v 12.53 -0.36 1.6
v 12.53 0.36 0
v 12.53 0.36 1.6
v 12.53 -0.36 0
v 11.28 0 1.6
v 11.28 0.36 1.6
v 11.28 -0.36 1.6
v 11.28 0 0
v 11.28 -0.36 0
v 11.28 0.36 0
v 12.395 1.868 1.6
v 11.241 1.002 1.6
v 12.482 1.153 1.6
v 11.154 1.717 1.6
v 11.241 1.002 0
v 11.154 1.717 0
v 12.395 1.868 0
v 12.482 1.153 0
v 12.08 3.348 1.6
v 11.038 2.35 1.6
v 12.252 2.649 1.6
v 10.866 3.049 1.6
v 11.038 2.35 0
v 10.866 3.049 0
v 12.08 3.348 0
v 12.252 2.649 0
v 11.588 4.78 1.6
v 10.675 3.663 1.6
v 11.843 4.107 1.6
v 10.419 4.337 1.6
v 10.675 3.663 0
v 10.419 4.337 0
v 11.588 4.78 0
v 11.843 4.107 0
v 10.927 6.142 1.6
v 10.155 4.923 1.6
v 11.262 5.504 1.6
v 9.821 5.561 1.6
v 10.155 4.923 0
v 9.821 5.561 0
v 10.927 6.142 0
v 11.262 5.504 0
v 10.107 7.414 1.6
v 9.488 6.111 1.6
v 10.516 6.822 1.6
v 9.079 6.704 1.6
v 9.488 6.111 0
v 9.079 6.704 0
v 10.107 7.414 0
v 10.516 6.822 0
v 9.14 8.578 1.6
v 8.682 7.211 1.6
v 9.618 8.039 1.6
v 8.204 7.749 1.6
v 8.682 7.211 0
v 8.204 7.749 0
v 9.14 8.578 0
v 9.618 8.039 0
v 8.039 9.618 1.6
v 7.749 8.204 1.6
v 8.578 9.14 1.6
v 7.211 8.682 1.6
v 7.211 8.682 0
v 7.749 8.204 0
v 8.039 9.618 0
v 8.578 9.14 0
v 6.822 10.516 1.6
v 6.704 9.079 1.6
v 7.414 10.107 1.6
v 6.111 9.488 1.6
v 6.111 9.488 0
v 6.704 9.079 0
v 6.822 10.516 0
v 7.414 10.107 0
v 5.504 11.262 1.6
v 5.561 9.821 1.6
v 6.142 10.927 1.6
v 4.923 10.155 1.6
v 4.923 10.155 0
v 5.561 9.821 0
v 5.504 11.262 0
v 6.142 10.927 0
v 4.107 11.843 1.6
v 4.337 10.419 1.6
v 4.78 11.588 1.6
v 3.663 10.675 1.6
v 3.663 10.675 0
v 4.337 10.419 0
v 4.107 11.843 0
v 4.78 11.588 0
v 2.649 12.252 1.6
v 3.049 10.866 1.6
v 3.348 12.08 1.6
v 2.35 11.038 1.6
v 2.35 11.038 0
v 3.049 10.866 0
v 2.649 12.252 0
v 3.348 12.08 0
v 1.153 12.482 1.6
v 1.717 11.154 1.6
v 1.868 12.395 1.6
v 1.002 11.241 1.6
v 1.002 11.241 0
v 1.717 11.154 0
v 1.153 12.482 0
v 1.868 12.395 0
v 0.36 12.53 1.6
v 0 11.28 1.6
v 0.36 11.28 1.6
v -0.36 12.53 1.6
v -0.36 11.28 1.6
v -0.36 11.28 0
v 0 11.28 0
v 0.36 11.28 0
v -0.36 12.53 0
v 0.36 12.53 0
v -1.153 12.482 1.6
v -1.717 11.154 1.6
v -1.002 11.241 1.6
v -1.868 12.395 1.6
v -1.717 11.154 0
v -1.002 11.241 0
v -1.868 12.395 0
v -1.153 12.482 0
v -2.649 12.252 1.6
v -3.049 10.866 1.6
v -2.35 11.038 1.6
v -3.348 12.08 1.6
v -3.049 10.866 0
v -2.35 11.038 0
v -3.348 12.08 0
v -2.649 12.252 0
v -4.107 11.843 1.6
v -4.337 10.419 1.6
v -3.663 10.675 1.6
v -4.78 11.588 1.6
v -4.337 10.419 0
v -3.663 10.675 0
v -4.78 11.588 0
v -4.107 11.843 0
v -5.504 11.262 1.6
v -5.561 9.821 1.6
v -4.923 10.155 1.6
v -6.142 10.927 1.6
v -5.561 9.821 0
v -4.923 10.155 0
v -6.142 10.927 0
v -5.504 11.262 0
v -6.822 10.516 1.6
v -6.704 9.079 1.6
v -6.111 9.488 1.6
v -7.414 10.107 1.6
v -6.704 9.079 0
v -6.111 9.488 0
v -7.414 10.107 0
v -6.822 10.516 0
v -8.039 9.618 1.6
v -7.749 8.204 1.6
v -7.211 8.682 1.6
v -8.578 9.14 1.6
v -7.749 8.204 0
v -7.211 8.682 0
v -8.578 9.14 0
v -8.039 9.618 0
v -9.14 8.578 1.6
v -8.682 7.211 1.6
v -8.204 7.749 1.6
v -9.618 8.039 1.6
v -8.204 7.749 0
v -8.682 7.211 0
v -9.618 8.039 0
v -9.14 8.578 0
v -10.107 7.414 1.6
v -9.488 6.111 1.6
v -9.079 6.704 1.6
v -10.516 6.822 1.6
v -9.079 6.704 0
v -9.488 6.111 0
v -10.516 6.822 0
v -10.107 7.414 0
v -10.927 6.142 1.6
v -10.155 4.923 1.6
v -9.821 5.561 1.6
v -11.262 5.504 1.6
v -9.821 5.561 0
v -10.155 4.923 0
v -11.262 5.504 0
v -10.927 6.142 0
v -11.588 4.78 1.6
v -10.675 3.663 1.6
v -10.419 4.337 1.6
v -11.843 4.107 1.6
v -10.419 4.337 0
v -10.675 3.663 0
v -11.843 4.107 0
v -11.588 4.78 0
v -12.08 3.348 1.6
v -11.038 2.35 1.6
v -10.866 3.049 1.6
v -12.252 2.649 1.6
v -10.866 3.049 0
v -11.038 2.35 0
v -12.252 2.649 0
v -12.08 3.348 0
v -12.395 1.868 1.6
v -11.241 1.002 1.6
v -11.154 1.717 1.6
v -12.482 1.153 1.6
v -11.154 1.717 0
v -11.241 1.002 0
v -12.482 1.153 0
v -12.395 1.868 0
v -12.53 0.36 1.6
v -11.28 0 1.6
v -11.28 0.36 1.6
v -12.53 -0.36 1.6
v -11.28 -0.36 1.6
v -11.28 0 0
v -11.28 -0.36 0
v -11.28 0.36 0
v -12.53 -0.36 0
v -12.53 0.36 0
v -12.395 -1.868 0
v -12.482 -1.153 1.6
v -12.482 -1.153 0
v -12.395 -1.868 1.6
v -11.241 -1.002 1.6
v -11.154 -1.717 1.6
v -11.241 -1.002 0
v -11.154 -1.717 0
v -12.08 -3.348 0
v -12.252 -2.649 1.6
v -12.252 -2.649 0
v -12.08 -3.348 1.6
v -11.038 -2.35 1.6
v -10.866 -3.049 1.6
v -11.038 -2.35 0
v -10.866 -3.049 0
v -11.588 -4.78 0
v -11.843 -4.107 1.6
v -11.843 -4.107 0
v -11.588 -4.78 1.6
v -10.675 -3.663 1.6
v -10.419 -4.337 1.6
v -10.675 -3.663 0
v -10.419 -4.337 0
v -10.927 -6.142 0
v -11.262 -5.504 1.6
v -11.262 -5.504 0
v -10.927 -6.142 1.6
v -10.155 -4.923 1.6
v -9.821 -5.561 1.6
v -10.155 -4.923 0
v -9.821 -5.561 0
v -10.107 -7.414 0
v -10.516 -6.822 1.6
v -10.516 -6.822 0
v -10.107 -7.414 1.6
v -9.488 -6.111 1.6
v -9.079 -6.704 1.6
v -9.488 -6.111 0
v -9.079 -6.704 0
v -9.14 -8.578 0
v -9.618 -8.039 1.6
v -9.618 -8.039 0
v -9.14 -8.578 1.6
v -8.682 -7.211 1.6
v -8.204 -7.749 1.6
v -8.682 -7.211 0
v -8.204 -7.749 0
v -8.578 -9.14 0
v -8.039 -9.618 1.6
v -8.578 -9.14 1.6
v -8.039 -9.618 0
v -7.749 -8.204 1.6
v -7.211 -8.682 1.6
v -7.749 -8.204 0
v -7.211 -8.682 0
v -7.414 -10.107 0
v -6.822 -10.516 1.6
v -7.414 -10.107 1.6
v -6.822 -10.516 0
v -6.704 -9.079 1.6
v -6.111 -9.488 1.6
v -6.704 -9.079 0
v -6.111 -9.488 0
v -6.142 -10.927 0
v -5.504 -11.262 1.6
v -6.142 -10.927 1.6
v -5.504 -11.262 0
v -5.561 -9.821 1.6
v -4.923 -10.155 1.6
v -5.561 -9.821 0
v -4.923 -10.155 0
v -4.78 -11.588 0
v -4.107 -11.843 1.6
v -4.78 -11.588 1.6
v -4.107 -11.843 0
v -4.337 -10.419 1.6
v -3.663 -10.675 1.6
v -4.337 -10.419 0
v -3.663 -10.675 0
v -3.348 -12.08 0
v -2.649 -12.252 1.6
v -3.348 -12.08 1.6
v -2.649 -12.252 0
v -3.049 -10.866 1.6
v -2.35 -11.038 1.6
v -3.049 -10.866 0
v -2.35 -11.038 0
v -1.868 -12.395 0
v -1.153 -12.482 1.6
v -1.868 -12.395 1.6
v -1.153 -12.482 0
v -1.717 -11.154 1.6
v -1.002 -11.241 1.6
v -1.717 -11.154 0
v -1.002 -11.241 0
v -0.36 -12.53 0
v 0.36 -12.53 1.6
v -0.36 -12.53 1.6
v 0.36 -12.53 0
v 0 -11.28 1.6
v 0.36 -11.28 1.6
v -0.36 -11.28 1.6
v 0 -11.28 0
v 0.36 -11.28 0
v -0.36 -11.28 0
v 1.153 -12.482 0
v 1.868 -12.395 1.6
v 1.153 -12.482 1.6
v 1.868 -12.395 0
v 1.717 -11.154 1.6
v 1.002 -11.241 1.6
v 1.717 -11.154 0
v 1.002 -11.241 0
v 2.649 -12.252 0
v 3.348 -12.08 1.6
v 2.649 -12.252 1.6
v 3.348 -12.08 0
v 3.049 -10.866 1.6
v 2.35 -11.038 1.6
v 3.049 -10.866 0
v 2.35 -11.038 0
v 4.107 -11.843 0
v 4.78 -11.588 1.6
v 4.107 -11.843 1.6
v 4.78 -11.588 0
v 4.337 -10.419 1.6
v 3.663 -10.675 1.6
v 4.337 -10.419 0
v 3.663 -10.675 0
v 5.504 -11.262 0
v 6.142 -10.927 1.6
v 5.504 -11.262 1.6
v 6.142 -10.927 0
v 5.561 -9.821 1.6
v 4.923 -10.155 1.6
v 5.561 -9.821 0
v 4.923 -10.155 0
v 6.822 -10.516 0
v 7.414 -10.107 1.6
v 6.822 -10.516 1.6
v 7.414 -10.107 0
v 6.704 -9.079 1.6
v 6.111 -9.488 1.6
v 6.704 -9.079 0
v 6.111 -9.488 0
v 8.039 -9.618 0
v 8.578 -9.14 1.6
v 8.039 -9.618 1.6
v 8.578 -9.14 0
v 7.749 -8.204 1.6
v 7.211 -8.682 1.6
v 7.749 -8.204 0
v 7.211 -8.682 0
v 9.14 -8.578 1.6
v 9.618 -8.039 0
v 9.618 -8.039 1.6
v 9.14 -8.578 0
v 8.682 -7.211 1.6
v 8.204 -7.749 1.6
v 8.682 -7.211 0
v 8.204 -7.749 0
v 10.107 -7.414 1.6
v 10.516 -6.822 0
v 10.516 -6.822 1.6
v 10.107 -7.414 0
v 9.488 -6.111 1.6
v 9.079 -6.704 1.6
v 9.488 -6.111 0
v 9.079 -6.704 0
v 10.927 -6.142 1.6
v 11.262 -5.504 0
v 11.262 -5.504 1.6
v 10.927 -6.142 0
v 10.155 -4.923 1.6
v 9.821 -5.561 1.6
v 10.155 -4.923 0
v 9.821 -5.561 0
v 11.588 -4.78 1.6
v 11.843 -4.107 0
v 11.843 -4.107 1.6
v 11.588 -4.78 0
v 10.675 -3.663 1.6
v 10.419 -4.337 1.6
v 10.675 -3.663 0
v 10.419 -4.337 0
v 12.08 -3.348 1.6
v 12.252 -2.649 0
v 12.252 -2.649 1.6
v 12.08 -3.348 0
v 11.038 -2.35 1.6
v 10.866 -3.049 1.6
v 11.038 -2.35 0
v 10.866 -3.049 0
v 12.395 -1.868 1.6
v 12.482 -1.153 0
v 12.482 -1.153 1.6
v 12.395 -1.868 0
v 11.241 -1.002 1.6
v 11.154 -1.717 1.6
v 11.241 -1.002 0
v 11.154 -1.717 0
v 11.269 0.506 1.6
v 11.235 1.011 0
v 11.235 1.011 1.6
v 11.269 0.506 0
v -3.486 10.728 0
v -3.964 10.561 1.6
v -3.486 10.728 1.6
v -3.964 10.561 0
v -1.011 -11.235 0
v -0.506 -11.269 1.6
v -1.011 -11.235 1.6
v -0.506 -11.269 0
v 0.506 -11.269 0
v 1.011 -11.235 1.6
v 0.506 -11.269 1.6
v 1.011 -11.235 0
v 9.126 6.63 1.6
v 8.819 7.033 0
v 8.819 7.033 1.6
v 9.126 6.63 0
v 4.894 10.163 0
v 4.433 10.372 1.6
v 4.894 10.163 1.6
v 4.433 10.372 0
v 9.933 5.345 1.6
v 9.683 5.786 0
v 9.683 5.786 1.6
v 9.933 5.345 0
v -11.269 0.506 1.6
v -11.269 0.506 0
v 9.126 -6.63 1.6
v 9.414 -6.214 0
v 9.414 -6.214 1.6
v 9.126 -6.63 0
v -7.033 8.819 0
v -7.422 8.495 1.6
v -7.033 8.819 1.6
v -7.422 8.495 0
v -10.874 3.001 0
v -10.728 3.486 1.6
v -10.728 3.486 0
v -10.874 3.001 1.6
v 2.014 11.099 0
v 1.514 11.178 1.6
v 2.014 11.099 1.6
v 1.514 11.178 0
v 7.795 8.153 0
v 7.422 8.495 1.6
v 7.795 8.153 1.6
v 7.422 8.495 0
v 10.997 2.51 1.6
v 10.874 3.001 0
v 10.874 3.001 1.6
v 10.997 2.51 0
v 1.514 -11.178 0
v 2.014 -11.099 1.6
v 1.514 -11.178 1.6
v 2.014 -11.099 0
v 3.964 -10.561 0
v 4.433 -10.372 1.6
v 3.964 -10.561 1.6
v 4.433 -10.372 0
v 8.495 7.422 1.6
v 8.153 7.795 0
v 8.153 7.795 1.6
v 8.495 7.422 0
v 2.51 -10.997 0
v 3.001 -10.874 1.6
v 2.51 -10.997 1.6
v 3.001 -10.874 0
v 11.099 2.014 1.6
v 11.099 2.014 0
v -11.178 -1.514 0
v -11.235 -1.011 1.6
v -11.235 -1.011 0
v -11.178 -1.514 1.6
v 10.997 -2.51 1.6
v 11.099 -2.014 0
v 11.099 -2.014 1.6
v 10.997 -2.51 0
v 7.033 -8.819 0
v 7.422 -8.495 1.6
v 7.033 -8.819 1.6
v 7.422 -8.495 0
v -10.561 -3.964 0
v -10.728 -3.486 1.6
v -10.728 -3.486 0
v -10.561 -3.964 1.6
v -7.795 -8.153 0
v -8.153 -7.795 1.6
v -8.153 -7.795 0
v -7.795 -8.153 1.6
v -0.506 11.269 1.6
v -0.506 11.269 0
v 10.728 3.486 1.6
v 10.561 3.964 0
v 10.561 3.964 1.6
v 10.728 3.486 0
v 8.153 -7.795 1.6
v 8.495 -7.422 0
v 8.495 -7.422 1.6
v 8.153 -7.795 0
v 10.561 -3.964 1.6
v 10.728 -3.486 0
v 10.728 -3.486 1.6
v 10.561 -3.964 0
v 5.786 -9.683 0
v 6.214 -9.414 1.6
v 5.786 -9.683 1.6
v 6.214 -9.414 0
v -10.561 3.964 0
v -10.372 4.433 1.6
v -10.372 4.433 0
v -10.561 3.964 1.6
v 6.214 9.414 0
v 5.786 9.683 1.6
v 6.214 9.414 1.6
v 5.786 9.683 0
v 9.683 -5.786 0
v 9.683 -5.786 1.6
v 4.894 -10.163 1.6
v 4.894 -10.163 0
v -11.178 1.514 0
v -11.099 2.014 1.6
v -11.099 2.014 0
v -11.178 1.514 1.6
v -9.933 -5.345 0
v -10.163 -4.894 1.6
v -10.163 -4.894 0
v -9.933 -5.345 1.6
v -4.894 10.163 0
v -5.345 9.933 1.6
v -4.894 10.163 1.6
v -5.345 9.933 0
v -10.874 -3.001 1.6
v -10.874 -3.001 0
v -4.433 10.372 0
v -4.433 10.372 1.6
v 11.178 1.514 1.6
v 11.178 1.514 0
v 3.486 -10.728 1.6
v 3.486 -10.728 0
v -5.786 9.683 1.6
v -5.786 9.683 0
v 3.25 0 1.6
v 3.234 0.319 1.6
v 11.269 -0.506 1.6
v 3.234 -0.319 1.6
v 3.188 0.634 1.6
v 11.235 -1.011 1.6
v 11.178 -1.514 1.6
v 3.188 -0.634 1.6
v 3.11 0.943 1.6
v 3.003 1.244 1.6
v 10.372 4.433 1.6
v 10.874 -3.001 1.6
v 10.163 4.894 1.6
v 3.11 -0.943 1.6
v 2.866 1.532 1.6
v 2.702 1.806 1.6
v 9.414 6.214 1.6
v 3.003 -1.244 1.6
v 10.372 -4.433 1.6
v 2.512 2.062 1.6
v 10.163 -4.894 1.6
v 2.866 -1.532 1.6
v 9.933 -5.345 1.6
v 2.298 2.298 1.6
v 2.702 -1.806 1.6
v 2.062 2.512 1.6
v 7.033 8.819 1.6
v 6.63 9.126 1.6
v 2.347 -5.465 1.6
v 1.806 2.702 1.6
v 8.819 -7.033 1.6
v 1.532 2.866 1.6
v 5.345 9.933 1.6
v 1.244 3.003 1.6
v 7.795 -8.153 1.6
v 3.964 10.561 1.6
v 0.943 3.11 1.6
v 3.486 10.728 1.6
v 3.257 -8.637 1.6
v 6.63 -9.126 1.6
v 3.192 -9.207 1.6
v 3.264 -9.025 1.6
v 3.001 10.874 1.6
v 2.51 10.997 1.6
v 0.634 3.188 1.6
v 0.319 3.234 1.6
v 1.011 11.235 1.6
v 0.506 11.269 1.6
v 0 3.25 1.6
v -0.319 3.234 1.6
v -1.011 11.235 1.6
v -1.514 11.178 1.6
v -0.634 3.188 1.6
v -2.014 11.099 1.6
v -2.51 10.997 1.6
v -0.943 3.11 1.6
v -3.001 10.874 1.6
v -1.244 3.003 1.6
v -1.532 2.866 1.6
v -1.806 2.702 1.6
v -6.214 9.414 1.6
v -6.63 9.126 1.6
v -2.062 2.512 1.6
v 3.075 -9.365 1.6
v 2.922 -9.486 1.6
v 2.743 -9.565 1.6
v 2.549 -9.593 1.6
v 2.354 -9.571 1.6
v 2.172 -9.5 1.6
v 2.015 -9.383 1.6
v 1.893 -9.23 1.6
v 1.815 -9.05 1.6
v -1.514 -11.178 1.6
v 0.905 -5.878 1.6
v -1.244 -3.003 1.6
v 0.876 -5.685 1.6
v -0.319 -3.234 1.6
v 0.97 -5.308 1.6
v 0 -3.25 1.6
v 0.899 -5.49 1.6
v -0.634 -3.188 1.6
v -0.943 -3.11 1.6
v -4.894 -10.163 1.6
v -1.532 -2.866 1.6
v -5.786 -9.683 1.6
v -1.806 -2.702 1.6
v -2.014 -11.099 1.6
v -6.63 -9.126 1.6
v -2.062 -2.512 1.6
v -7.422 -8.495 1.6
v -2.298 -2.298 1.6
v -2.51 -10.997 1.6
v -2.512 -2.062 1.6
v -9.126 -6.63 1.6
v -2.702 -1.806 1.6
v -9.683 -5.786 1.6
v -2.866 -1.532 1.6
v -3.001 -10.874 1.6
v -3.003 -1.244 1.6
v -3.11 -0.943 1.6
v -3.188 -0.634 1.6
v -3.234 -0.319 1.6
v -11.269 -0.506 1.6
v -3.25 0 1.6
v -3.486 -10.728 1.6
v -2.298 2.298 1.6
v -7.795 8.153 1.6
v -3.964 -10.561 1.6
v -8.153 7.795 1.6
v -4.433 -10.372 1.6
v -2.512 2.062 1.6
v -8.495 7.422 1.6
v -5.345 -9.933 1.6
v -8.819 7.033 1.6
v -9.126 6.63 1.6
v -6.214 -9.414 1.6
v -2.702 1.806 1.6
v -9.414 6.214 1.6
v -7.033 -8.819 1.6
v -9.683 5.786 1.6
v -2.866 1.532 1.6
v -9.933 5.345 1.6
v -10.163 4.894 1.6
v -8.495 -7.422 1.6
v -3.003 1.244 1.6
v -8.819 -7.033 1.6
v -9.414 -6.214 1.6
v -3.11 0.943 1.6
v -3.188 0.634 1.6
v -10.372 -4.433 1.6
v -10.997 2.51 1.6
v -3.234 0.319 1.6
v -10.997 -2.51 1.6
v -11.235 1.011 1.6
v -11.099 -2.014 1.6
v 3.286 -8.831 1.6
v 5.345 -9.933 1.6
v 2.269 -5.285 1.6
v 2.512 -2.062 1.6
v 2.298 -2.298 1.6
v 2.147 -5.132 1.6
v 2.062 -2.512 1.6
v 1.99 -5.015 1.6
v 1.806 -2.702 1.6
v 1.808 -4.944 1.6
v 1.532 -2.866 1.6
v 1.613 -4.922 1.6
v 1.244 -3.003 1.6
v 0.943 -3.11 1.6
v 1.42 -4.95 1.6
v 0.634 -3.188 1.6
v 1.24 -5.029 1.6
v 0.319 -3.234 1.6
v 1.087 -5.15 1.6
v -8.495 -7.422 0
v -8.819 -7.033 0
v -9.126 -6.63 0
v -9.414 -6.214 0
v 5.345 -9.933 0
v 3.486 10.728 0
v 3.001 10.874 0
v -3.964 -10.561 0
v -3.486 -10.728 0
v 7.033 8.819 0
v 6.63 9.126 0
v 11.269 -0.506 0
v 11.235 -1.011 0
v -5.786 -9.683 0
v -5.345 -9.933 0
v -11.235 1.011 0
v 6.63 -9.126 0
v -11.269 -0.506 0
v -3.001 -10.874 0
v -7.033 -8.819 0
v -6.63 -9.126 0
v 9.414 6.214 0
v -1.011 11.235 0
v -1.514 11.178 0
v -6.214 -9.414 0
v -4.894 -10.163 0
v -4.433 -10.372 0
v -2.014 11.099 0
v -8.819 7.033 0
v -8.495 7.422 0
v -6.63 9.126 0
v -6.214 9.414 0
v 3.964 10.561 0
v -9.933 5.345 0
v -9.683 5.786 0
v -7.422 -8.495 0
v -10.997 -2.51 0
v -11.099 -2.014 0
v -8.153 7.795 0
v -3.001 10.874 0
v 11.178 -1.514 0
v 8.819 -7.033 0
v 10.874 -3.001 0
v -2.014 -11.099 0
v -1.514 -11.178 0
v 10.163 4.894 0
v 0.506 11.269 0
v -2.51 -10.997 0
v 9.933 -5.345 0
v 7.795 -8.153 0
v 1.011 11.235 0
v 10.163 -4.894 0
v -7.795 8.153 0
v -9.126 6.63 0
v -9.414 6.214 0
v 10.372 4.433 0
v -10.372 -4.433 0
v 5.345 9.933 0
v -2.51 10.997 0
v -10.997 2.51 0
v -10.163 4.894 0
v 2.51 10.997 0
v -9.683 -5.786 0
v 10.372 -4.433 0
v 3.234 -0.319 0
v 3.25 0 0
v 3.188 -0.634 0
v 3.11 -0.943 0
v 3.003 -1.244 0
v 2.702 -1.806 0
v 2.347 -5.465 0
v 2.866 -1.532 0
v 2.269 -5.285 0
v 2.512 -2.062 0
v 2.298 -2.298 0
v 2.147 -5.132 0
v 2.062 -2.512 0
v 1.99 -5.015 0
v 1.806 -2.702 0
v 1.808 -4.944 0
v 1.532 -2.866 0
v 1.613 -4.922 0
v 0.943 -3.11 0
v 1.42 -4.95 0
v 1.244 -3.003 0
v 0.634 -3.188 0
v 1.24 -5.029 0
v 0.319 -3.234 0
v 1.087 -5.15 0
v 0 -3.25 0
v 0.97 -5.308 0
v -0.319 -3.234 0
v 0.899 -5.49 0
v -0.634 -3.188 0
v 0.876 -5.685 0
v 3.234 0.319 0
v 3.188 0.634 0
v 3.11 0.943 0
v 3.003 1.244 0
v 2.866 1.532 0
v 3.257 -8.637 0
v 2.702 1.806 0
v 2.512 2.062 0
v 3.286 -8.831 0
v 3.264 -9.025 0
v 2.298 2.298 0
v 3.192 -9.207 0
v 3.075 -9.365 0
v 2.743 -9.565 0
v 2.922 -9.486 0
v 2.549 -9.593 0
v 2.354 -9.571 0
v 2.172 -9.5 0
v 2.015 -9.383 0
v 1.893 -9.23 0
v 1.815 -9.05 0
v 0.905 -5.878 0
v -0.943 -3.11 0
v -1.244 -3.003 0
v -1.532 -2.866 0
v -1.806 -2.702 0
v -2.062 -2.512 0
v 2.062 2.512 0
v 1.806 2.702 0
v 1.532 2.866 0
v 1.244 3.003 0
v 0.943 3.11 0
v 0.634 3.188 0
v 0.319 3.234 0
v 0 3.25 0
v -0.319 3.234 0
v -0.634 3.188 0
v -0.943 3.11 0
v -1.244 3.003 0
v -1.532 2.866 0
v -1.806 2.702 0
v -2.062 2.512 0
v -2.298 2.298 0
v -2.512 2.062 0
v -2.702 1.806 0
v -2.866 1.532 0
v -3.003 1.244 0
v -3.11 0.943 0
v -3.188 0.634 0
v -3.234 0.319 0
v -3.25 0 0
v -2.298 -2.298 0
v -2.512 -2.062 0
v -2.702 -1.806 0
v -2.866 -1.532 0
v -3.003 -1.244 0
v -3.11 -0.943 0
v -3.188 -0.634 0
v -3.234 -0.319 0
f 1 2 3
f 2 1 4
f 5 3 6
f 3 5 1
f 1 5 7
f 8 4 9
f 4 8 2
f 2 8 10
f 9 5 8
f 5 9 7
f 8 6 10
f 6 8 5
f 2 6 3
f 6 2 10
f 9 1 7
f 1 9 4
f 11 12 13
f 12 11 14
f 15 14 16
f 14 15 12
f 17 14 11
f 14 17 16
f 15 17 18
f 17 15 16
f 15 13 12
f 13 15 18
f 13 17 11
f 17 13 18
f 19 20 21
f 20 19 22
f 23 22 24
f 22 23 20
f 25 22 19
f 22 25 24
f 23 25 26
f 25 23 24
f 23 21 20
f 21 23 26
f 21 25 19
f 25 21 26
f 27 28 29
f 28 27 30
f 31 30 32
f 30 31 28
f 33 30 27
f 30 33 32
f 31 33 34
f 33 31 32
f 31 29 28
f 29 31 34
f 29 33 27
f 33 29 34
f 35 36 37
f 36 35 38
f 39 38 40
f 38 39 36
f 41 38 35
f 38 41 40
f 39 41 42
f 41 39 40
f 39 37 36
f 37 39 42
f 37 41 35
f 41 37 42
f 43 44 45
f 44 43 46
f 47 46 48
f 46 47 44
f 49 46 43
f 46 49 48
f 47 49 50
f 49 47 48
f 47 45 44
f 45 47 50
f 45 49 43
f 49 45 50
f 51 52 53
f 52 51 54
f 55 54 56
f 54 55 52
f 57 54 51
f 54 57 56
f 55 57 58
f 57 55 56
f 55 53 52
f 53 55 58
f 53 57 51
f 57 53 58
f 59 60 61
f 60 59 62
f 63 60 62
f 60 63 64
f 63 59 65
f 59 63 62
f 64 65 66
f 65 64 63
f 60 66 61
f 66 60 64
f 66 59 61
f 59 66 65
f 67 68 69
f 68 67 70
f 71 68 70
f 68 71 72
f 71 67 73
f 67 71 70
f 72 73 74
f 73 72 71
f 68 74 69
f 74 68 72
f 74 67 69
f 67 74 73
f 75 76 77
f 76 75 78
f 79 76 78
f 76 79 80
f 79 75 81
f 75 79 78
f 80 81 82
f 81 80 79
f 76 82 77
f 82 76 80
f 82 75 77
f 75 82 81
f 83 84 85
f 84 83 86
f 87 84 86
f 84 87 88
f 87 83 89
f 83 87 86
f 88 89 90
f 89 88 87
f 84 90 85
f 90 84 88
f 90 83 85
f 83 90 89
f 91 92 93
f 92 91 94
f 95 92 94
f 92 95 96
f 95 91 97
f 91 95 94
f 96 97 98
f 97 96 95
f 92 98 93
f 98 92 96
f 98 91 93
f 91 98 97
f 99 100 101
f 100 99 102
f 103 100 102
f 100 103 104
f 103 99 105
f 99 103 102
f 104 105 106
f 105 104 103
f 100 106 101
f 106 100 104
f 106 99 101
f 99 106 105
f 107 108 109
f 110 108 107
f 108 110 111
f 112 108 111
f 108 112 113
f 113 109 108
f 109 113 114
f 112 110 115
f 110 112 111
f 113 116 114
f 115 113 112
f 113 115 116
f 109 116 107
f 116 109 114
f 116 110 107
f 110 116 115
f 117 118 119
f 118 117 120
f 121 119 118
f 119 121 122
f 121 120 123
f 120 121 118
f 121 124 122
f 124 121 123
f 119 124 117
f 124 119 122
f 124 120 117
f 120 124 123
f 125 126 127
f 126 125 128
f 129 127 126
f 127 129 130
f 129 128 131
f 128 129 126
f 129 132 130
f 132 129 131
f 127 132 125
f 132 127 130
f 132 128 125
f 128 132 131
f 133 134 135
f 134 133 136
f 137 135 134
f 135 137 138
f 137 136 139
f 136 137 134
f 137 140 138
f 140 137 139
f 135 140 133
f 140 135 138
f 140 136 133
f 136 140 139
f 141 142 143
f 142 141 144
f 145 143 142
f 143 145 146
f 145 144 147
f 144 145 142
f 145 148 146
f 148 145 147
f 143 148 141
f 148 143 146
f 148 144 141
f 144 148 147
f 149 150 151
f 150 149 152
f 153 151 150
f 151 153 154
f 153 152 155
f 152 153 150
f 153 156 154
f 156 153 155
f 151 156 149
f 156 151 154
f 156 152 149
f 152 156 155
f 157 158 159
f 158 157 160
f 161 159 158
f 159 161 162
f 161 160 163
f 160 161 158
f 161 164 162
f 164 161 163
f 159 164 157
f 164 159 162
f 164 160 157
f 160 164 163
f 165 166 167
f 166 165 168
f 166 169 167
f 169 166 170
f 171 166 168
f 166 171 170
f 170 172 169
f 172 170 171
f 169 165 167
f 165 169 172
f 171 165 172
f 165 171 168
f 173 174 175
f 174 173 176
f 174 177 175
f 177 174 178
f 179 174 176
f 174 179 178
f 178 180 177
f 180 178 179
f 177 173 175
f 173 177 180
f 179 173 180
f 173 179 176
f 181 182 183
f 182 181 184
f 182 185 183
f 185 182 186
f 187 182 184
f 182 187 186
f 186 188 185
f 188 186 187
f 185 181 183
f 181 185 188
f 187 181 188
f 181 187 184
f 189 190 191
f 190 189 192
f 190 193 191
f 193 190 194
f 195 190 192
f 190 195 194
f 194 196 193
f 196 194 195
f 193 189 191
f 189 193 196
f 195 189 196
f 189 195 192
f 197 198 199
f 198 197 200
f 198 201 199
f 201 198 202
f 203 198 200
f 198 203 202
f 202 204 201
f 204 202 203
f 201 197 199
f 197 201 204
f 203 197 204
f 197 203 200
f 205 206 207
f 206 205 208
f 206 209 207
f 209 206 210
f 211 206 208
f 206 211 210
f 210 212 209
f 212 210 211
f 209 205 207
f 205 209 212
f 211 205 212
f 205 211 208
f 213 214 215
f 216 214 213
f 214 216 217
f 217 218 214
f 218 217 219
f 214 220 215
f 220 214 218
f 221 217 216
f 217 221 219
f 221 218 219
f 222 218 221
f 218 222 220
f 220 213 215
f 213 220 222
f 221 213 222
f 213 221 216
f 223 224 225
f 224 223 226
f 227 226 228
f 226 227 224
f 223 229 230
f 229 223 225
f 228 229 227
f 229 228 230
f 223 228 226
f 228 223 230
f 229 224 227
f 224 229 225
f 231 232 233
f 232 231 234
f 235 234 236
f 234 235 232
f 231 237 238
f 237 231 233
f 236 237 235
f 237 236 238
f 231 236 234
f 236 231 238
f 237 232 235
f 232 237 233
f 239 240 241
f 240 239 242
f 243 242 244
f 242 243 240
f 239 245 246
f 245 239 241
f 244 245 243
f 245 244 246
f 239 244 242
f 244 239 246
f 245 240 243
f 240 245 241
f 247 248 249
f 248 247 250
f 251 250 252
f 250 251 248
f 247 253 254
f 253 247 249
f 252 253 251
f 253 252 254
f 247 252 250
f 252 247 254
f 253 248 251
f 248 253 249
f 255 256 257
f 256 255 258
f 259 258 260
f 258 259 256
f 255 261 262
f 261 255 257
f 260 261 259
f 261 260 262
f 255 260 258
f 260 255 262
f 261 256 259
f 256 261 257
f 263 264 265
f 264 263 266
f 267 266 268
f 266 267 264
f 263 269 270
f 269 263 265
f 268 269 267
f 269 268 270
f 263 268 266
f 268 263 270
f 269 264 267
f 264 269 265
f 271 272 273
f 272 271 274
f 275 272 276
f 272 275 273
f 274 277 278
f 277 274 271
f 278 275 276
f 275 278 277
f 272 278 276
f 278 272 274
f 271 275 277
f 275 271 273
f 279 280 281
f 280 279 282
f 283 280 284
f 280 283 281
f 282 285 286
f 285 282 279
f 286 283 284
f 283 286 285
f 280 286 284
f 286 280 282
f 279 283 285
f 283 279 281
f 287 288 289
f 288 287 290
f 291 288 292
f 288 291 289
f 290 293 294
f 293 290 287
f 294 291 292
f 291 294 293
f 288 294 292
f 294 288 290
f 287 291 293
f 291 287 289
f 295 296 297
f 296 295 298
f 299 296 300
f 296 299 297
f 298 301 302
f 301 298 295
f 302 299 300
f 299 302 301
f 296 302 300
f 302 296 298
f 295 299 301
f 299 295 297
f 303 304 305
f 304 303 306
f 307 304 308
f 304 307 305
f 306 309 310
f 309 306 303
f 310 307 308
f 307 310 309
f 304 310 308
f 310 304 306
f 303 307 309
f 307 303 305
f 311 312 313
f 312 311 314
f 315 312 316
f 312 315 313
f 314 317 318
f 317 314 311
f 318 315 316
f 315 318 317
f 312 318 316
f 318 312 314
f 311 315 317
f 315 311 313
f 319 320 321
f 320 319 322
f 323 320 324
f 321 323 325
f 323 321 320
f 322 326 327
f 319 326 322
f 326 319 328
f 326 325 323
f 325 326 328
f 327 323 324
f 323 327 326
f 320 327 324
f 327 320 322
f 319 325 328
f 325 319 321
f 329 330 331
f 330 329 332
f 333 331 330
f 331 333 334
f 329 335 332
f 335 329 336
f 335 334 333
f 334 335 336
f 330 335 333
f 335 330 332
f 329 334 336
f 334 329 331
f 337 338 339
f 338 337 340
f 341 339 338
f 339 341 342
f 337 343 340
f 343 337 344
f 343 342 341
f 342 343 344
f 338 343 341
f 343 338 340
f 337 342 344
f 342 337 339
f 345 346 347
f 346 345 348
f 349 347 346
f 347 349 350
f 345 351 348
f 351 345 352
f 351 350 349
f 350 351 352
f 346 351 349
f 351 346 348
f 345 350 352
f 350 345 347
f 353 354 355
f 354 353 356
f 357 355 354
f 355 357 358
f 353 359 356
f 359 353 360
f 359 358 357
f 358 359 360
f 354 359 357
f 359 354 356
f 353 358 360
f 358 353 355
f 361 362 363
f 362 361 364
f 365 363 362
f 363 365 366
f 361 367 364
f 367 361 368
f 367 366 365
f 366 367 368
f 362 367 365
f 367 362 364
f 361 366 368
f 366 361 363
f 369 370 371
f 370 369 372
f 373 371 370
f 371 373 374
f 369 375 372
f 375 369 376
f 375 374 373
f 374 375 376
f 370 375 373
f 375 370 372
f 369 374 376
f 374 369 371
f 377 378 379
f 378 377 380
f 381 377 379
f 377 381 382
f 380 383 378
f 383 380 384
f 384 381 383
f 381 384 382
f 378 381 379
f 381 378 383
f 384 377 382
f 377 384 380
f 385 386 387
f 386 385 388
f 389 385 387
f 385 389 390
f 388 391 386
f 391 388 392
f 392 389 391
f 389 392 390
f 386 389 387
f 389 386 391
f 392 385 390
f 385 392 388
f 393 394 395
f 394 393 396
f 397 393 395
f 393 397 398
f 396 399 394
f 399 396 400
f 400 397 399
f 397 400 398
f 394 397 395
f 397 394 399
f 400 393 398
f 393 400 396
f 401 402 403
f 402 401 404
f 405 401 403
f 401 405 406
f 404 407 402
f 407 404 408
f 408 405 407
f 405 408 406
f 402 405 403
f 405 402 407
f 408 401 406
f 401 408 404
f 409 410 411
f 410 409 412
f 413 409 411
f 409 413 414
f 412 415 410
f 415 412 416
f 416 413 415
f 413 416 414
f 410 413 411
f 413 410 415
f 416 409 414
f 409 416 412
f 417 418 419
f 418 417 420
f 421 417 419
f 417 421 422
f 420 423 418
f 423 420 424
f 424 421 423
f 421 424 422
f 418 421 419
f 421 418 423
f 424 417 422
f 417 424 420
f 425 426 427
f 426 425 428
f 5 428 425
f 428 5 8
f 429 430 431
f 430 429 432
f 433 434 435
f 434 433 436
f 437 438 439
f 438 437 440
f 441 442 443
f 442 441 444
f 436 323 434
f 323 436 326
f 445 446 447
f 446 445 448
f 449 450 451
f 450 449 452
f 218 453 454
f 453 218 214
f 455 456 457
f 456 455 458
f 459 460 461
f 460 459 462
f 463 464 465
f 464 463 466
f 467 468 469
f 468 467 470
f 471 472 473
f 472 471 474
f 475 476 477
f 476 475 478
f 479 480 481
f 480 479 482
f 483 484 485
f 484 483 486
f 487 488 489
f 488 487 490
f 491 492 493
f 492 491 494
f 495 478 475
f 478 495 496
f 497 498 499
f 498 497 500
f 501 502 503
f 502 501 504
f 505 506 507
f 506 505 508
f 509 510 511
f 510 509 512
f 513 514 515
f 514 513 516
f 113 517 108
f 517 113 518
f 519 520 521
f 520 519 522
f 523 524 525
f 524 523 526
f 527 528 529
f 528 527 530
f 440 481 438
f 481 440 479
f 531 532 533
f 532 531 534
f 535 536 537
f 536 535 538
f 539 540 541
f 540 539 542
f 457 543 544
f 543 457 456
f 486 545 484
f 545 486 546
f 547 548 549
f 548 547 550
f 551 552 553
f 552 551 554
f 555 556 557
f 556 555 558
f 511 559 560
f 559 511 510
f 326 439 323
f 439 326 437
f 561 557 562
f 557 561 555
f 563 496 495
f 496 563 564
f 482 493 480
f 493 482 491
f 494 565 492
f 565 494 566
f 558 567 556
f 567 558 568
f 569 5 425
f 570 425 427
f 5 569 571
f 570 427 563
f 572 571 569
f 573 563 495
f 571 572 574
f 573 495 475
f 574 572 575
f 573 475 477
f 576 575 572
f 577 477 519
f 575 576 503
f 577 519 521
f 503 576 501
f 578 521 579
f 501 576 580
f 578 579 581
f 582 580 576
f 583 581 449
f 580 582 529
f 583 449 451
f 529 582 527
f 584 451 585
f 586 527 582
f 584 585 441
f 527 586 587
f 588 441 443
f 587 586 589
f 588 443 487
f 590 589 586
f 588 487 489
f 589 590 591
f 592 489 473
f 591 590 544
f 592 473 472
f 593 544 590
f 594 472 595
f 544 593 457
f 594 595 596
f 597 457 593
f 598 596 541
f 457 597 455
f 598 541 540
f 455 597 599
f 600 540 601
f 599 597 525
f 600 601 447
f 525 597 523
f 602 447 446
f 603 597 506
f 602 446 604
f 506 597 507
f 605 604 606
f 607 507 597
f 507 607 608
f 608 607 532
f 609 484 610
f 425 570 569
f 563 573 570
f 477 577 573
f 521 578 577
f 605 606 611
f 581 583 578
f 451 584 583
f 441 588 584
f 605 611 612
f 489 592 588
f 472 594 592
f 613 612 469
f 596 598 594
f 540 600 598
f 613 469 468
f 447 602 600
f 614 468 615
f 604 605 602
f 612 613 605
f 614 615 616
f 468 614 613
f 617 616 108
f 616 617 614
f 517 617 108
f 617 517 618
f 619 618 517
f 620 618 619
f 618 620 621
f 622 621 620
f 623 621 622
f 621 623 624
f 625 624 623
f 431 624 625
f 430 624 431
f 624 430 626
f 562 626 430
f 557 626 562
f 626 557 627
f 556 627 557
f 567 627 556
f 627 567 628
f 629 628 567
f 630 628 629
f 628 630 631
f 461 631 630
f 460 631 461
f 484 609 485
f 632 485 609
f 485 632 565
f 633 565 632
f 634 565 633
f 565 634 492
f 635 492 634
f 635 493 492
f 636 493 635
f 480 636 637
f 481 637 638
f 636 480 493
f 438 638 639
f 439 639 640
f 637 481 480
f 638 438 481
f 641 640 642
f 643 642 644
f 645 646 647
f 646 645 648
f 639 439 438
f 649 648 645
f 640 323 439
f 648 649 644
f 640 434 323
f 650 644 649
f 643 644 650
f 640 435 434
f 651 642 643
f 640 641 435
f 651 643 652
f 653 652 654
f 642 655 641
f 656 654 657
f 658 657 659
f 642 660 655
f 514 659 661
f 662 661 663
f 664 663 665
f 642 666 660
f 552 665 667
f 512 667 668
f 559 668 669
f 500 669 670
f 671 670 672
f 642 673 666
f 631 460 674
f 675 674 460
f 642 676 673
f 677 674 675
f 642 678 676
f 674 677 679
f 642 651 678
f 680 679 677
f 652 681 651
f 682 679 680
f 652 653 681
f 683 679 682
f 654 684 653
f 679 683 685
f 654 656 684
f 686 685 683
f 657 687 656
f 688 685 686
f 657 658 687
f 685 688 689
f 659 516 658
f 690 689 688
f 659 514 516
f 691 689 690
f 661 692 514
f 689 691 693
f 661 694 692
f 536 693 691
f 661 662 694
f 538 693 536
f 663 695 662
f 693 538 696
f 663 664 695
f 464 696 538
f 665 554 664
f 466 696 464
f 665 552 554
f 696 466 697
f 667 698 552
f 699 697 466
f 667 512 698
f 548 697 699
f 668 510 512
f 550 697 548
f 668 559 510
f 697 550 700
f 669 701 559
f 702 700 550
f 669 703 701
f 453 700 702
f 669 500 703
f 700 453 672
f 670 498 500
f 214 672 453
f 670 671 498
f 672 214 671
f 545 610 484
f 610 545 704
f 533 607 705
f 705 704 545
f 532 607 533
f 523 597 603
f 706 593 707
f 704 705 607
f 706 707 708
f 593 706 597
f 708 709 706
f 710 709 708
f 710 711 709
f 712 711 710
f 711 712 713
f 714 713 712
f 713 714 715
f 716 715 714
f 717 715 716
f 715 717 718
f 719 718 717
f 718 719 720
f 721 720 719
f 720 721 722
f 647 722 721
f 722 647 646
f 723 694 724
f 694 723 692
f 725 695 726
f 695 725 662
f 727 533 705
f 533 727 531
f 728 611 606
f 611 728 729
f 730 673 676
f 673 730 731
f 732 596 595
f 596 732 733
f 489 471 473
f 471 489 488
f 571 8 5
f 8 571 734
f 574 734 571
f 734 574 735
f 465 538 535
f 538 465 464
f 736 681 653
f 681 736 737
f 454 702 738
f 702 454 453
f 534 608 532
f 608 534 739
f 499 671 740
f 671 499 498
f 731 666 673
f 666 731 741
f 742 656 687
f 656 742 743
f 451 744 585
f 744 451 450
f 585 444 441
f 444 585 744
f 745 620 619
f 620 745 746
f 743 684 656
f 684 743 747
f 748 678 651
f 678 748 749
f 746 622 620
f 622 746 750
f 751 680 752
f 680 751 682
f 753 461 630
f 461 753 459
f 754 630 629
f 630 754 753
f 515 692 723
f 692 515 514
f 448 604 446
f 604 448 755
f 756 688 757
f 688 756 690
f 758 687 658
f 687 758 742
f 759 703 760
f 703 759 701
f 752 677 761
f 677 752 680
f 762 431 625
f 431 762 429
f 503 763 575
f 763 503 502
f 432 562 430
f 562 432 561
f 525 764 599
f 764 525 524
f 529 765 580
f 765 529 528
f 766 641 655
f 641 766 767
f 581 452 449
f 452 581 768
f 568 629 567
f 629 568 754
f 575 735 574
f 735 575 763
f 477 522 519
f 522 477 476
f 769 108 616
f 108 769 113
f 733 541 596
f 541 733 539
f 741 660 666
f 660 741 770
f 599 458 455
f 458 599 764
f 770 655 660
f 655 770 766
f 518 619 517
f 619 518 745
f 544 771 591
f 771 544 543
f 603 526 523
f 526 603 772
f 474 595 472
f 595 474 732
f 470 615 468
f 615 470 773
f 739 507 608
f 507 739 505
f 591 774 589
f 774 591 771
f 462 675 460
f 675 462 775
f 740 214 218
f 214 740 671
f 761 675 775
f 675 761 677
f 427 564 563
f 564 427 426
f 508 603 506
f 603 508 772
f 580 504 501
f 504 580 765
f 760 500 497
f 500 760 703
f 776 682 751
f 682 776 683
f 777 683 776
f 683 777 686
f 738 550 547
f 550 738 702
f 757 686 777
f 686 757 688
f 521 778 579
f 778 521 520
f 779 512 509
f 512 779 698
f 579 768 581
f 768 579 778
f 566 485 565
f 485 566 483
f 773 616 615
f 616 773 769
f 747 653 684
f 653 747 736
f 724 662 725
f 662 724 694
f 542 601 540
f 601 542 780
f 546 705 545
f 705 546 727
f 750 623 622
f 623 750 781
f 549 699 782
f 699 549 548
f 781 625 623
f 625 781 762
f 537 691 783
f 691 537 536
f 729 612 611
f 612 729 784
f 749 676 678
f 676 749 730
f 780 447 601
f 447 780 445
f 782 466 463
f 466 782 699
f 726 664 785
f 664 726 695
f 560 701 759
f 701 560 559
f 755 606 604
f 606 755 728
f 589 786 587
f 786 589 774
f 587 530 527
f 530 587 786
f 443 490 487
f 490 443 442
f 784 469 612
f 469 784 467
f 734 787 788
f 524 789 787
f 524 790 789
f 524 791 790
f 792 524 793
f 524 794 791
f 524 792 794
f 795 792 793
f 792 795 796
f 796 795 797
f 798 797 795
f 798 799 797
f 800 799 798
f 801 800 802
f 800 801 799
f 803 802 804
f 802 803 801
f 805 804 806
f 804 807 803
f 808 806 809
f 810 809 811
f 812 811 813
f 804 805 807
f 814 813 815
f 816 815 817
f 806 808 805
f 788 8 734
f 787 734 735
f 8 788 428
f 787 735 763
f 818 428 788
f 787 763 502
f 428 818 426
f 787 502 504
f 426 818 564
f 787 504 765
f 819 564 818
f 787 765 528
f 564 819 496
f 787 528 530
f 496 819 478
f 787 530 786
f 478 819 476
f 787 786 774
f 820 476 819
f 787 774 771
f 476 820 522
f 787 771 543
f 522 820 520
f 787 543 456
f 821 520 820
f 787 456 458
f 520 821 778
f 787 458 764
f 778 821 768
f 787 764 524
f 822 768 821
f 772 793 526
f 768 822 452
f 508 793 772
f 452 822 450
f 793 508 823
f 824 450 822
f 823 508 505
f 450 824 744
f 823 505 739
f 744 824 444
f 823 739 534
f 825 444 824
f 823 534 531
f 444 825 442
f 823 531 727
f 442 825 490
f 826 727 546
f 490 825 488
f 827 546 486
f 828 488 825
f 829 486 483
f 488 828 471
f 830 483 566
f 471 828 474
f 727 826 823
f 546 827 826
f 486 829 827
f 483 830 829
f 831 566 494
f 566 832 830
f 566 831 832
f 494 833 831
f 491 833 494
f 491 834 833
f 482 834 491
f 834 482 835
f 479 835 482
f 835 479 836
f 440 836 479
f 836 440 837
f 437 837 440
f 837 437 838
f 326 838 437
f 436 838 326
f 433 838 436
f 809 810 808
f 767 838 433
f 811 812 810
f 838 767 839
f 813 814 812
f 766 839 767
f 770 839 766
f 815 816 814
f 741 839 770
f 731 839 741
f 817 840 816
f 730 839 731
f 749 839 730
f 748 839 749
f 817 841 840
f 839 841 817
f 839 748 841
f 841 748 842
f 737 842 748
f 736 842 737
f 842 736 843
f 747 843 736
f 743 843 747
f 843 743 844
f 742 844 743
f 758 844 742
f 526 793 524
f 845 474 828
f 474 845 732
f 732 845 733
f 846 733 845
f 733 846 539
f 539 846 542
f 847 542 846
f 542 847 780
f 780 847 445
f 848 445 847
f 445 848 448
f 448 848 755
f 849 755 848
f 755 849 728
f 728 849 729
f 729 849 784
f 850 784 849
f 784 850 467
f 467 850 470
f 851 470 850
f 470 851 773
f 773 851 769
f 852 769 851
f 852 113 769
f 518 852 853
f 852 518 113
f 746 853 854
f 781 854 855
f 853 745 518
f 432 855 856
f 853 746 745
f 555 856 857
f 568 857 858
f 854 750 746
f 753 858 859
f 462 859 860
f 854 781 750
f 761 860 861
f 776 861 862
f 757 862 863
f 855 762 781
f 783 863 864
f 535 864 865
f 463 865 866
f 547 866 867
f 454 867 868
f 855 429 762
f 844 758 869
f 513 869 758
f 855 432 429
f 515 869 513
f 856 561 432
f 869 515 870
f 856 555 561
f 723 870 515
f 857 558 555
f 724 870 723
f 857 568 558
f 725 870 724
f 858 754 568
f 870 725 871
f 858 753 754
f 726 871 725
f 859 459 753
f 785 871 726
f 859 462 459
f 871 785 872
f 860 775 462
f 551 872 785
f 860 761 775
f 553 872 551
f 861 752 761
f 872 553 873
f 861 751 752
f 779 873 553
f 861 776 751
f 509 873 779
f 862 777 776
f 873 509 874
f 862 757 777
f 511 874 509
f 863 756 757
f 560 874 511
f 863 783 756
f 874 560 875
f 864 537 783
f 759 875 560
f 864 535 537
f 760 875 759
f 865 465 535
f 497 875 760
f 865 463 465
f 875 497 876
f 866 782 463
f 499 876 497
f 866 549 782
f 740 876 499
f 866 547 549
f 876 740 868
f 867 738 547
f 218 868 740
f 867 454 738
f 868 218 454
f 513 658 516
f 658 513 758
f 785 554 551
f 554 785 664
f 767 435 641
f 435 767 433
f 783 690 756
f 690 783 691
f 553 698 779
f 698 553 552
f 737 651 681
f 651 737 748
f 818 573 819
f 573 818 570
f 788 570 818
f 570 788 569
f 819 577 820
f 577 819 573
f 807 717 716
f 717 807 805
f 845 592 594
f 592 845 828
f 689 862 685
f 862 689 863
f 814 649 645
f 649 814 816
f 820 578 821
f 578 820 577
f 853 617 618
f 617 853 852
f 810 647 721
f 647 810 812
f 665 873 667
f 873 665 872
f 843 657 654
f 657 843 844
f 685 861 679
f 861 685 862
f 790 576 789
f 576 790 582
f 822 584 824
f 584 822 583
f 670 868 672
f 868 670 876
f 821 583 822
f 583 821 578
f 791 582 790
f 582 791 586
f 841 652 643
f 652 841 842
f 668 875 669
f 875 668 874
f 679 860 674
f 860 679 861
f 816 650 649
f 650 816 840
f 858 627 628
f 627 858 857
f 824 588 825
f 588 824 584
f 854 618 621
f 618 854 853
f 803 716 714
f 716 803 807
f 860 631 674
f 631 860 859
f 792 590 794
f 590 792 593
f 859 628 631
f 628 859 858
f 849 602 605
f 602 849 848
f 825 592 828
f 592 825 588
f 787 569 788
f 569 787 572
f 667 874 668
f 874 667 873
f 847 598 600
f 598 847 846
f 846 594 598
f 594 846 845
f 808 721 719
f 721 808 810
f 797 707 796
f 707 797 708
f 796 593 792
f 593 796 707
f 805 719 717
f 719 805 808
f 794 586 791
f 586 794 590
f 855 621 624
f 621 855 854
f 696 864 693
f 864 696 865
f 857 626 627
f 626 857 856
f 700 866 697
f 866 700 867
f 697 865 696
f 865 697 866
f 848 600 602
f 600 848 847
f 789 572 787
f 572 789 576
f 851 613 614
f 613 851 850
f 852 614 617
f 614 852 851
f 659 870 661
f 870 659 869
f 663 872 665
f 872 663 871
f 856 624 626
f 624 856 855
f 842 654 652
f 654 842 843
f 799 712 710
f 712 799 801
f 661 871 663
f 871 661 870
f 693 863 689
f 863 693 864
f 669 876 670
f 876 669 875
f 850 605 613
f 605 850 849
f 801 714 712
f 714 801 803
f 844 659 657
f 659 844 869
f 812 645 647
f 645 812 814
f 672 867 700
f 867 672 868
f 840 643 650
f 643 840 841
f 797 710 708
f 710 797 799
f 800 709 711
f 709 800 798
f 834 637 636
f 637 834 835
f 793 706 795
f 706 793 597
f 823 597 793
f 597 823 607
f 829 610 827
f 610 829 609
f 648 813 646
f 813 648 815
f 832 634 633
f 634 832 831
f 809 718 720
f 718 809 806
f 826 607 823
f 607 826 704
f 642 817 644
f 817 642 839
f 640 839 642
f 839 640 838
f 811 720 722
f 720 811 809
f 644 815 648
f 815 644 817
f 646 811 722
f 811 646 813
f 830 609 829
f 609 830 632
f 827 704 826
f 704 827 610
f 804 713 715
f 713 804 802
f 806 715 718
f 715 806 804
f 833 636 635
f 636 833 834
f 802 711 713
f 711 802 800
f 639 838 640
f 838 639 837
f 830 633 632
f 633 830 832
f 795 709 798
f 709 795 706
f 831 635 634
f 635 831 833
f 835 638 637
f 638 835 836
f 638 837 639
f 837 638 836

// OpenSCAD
// part_id: jup3
// name: Jupiter intermediate gear
// source_drawing_ids: DRW-012
// units: mm
// revision: 0.1
// SPDX-License-Identifier: MIT

module jup3_tooth_ring(root_d = 22.56, tip_d = 25.06, tooth_count = 52, thickness = 1.6, tooth_w = 0.72) {
    union() {
        cylinder(d = root_d, h = thickness, center = false, $fn = 140);
        for (a = [0 : 360 / tooth_count : 360 - 360 / tooth_count]) {
            rotate([0, 0, a])
                translate([root_d / 2, -tooth_w / 2, 0])
                    cube([(tip_d - root_d) / 2, tooth_w, thickness], center = false);
        }
    }
}

module part_jup3(
    root_d = 22.56,
    tip_d = 25.06,
    tooth_count = 52,
    thickness = 1.6,
    bore_d = 6.5,
    slot_w = 1.5,
    slot_l = 3.3,
    slot_r = 5.9,
    slot_a = -74
) {
    difference() {
        jup3_tooth_ring(root_d = root_d, tip_d = tip_d, tooth_count = tooth_count, thickness = thickness);
        translate([0, 0, -0.05]) cylinder(d = bore_d, h = thickness + 0.1, $fn = 64);
        rotate([0, 0, slot_a]) translate([slot_r, 0, -0.05]) hull() {
            cylinder(d = slot_w, h = thickness + 0.1, $fn = 24);
            translate([slot_l, 0, 0]) cylinder(d = slot_w, h = thickness + 0.1, $fn = 24);
        }
    }
}

// ---- "main guard" ----
// Default to previewing when opened directly:
if (is_undef(__LIB_MODE__)) {
    part_jup3();
}
